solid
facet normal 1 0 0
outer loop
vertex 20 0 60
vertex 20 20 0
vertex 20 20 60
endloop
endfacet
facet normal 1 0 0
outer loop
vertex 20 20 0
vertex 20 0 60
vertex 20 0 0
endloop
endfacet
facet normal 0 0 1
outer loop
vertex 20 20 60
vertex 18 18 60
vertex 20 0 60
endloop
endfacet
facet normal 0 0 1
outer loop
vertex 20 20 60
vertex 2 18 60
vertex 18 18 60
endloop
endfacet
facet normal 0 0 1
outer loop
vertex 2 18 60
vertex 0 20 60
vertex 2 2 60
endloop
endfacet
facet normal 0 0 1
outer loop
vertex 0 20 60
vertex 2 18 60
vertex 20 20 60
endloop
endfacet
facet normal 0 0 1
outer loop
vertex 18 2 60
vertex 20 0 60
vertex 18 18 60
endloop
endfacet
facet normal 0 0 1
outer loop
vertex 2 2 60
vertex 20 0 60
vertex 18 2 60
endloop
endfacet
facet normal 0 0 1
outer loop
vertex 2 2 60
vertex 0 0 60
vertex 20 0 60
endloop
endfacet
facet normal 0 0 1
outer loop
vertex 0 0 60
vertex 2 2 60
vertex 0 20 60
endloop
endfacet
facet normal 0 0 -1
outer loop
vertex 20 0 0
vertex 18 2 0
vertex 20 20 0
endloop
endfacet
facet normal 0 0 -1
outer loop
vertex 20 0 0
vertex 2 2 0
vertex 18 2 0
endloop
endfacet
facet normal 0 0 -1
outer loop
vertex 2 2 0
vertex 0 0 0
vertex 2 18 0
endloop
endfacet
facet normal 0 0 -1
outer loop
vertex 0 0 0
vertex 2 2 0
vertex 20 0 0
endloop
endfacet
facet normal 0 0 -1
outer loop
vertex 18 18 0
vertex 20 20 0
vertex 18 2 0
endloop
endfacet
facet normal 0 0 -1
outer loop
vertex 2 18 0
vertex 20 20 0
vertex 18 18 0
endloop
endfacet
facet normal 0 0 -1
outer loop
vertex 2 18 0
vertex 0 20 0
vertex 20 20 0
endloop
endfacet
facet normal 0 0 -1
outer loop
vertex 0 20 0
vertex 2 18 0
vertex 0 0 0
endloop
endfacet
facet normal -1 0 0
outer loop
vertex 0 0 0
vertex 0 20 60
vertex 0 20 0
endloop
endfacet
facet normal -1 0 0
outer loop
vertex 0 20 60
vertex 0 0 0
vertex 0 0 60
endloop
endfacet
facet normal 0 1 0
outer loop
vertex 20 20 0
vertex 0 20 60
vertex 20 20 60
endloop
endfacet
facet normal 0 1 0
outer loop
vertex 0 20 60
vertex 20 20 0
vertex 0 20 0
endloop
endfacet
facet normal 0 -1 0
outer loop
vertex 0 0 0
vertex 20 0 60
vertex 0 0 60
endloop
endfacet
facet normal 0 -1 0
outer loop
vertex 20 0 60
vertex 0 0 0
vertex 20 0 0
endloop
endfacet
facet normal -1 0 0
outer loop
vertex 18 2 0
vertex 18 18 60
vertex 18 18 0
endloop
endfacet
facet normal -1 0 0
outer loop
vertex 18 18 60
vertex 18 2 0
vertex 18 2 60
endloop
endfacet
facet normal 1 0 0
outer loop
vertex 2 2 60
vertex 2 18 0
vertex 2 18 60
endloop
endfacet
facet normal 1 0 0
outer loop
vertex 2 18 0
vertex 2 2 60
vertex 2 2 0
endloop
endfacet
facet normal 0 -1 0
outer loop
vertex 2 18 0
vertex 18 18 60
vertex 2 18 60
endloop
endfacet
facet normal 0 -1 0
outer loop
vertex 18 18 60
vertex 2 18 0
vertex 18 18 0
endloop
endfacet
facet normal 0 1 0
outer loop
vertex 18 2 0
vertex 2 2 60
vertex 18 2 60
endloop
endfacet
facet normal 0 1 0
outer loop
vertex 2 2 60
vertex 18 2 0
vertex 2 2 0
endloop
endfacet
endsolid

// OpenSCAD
translate([0.0,0.0,0.0])scale([1.0,1.0,1.0])difference()  {
cube([20.0,20.0,60.0]);
translate([2.0,2.0,0.0])cube([16.0,16.0,60.0]);
}
